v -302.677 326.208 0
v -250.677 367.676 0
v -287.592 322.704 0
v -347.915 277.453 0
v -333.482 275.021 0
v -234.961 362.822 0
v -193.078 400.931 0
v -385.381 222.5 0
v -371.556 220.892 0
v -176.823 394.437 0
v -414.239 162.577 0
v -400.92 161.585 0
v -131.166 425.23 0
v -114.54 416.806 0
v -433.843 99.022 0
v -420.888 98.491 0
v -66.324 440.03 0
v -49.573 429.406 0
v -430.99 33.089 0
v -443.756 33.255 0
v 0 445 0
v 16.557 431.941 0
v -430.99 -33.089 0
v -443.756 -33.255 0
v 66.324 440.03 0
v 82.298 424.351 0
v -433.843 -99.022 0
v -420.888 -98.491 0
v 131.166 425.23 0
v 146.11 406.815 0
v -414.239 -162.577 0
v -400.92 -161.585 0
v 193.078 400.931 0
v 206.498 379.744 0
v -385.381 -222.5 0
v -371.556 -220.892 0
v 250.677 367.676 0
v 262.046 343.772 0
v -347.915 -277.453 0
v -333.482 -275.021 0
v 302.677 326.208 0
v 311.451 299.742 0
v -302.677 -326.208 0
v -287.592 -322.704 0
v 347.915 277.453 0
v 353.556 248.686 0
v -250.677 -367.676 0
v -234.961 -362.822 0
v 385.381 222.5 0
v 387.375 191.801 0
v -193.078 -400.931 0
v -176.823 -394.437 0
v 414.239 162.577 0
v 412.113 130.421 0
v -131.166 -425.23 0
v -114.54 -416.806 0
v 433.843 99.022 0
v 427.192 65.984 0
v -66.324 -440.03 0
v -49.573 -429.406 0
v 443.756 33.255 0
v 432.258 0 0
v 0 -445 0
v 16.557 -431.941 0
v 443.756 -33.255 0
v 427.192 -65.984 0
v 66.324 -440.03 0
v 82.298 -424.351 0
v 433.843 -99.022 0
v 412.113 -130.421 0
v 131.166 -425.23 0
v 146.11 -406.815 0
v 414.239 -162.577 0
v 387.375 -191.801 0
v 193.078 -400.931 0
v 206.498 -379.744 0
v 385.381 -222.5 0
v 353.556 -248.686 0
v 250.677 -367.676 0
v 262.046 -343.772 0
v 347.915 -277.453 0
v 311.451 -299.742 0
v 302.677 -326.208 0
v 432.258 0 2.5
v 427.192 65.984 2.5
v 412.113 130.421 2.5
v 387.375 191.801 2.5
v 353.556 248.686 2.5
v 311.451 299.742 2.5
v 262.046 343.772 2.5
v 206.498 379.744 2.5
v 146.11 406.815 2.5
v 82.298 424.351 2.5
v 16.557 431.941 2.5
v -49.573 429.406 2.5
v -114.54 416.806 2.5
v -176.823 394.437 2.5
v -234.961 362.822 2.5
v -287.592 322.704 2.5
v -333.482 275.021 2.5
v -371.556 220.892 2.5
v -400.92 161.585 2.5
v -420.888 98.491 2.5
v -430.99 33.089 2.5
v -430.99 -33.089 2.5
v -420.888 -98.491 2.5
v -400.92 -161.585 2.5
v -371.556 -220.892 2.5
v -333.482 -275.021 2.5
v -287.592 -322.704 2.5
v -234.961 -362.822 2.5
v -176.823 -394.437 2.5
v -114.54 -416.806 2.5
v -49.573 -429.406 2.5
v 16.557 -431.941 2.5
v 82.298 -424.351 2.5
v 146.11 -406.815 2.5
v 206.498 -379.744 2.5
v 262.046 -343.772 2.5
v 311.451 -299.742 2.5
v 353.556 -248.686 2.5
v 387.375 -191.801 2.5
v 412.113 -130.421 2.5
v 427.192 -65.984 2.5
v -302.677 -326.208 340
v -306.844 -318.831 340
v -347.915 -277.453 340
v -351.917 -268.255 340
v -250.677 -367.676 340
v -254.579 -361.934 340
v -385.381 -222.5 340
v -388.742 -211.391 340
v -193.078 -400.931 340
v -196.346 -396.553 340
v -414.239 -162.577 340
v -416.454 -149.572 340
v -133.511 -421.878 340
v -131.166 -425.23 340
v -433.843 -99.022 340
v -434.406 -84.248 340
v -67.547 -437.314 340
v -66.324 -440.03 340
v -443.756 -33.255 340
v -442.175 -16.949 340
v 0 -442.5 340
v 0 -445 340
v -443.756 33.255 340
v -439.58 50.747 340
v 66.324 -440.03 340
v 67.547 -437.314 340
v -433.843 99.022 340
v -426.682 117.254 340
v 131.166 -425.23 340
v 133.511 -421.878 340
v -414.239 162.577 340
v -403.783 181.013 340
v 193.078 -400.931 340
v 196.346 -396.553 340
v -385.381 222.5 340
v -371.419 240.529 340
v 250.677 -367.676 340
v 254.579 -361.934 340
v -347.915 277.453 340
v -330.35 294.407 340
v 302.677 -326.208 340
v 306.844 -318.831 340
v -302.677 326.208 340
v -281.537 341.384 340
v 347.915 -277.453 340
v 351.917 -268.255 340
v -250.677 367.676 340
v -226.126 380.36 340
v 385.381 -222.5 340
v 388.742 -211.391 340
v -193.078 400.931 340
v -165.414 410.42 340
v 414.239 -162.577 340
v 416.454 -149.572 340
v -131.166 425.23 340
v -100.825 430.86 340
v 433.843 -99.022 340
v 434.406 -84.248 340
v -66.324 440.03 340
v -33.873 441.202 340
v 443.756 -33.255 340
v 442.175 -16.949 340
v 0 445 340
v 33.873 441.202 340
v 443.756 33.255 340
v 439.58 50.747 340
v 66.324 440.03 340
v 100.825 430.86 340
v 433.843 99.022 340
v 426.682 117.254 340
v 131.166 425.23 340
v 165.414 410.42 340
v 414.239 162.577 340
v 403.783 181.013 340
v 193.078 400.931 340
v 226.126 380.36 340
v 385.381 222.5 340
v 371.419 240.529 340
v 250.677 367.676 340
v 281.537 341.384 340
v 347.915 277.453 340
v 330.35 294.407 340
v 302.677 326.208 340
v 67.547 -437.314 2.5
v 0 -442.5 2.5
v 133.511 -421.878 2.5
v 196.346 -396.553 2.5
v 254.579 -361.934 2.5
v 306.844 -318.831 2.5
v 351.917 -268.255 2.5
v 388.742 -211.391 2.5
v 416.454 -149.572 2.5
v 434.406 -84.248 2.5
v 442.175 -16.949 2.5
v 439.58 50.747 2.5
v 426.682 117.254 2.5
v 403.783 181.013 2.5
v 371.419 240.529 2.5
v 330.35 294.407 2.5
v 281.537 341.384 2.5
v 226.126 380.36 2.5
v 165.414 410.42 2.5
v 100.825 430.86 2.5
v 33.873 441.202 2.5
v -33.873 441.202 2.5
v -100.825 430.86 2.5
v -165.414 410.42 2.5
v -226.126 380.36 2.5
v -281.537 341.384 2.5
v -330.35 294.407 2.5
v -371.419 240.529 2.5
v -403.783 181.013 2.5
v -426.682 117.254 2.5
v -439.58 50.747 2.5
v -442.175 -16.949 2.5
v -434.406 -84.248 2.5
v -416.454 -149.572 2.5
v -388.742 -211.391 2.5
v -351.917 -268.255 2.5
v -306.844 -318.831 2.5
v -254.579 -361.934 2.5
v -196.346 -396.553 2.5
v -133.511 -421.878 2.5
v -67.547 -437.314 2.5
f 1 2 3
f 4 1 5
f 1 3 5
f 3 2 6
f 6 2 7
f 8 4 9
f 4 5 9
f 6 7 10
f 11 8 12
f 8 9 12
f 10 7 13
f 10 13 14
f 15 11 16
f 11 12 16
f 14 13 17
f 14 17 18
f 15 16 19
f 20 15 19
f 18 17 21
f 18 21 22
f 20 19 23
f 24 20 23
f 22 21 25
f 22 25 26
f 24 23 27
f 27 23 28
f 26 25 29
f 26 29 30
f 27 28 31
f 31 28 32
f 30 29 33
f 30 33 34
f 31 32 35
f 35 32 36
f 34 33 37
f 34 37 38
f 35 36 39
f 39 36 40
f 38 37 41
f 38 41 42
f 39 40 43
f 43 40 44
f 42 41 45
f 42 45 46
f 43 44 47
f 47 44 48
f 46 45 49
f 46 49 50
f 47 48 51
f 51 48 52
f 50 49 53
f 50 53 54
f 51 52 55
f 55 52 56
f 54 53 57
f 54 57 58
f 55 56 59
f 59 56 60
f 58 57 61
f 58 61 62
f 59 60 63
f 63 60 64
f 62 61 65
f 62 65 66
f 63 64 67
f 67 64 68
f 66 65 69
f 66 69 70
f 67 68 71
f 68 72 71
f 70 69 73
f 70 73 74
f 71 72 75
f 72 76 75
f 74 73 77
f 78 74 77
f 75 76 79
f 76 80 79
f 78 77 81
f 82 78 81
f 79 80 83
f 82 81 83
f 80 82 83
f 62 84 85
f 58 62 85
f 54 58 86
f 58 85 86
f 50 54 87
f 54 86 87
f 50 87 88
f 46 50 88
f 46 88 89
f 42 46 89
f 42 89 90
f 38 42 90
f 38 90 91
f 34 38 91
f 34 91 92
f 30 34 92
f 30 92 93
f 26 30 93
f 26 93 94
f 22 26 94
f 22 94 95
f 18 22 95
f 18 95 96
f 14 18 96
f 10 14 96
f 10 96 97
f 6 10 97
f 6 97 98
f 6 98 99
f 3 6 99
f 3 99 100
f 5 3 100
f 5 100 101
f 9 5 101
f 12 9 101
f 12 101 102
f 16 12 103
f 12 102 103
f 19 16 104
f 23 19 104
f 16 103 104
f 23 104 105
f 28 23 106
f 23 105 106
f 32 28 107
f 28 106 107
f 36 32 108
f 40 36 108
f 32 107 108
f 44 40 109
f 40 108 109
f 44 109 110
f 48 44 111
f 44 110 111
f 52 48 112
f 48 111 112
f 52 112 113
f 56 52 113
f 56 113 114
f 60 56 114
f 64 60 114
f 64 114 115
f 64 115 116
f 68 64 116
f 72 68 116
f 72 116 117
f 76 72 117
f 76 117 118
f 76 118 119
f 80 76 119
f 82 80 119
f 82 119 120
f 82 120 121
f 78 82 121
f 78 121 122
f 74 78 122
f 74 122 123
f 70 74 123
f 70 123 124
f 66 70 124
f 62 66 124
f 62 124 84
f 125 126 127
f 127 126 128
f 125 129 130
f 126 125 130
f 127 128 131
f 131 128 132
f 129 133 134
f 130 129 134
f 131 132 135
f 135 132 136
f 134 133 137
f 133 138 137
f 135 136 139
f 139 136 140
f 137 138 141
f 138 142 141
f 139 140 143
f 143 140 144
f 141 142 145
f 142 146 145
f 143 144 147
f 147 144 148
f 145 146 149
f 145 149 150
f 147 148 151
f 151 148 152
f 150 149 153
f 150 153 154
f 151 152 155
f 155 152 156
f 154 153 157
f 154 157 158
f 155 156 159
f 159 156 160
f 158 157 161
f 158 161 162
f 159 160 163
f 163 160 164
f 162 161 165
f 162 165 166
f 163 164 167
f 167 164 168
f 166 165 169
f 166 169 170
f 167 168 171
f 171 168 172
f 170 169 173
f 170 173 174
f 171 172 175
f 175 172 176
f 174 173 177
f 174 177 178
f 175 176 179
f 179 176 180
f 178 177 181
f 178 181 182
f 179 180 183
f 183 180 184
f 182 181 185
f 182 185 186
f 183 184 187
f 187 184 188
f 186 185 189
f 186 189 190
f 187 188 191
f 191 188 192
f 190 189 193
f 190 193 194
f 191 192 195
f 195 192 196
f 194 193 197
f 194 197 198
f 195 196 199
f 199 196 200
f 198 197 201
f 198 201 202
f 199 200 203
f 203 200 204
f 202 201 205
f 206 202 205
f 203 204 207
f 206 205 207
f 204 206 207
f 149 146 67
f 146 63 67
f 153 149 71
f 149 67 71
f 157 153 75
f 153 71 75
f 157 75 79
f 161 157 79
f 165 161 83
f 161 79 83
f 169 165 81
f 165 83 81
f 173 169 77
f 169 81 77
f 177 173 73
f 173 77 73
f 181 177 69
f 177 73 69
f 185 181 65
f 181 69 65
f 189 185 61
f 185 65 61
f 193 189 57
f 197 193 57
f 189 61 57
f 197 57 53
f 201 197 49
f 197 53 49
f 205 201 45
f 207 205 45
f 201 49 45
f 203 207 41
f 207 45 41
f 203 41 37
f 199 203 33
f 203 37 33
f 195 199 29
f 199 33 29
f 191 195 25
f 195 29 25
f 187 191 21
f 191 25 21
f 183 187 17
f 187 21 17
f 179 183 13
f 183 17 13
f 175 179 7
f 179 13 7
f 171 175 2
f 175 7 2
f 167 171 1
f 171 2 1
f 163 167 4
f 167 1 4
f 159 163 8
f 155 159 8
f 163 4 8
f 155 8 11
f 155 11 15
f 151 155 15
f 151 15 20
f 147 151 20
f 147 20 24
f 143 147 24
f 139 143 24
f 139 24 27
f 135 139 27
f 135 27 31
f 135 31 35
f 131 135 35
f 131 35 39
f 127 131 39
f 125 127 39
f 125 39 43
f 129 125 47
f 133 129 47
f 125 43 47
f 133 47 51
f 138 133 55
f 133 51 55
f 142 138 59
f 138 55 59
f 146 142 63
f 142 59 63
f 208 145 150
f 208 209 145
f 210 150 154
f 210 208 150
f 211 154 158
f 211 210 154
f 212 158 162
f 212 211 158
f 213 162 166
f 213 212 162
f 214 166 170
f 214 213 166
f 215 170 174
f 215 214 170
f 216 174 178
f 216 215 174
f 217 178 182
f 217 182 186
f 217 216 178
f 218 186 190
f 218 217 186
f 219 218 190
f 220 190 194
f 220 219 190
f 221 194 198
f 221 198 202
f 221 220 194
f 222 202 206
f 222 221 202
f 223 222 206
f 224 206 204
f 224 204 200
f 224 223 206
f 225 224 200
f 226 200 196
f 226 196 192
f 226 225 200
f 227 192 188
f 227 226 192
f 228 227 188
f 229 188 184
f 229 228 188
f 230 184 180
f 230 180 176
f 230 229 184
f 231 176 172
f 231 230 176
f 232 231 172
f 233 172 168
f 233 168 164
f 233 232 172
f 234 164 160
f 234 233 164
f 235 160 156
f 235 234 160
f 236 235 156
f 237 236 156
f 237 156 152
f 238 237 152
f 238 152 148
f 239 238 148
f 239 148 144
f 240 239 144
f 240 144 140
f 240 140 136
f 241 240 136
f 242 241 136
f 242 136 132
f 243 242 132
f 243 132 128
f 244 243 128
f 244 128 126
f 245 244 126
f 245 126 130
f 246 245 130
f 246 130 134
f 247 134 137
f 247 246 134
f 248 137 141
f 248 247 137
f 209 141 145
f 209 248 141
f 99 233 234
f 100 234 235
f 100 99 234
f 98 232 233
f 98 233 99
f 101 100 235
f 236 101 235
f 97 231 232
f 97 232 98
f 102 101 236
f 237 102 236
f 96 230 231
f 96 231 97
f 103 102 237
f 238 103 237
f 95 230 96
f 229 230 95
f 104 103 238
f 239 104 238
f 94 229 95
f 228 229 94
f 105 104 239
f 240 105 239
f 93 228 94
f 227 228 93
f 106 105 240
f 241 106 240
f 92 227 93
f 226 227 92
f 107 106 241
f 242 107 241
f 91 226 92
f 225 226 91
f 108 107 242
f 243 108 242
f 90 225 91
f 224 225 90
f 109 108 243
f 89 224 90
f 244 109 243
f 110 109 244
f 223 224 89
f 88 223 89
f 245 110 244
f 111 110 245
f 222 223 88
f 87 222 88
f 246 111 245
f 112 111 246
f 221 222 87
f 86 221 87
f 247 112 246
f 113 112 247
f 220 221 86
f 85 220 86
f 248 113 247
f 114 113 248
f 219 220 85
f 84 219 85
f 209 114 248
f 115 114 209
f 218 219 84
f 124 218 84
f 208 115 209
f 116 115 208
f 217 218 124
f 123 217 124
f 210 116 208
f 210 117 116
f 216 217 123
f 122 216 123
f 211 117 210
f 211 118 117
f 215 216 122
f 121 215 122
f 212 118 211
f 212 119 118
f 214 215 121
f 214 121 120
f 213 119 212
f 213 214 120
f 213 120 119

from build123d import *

# Parameters (mm, degrees)
F0_W     = 100
F0_H     = 50
F2_T     = -2.5
F3_R     = 432.257955
F4_DEPTH = 2.501


with BuildPart() as f1:
    # F0 (on Right) → F1 (revolve)
    with BuildSketch(Plane.YZ):
        Polygon((-220, 0), (0, 0), (0, 340), (-445, 340), (-445, 0), (-320, 0), (-320, 50), (-220, 50), align=None)
        with Locations((-270, 25)):
            Rectangle(F0_W, F0_H)
    revolve(axis=Axis((0, 0, 170), (0, 0, 1)))

    # F2
    f2_openings = [f1.faces().sort_by_distance(p)[0] for p in [
        (0, 0, 340),
    ]]
    offset(amount=F2_T, openings=f2_openings)

    # F3 (on face) → F4 (cut, through all)
    with BuildSketch(Plane.XY.offset(2.5)):
        Circle(F3_R)
    extrude(amount=-F4_DEPTH, mode=Mode.SUBTRACT)


solid = f1.part
